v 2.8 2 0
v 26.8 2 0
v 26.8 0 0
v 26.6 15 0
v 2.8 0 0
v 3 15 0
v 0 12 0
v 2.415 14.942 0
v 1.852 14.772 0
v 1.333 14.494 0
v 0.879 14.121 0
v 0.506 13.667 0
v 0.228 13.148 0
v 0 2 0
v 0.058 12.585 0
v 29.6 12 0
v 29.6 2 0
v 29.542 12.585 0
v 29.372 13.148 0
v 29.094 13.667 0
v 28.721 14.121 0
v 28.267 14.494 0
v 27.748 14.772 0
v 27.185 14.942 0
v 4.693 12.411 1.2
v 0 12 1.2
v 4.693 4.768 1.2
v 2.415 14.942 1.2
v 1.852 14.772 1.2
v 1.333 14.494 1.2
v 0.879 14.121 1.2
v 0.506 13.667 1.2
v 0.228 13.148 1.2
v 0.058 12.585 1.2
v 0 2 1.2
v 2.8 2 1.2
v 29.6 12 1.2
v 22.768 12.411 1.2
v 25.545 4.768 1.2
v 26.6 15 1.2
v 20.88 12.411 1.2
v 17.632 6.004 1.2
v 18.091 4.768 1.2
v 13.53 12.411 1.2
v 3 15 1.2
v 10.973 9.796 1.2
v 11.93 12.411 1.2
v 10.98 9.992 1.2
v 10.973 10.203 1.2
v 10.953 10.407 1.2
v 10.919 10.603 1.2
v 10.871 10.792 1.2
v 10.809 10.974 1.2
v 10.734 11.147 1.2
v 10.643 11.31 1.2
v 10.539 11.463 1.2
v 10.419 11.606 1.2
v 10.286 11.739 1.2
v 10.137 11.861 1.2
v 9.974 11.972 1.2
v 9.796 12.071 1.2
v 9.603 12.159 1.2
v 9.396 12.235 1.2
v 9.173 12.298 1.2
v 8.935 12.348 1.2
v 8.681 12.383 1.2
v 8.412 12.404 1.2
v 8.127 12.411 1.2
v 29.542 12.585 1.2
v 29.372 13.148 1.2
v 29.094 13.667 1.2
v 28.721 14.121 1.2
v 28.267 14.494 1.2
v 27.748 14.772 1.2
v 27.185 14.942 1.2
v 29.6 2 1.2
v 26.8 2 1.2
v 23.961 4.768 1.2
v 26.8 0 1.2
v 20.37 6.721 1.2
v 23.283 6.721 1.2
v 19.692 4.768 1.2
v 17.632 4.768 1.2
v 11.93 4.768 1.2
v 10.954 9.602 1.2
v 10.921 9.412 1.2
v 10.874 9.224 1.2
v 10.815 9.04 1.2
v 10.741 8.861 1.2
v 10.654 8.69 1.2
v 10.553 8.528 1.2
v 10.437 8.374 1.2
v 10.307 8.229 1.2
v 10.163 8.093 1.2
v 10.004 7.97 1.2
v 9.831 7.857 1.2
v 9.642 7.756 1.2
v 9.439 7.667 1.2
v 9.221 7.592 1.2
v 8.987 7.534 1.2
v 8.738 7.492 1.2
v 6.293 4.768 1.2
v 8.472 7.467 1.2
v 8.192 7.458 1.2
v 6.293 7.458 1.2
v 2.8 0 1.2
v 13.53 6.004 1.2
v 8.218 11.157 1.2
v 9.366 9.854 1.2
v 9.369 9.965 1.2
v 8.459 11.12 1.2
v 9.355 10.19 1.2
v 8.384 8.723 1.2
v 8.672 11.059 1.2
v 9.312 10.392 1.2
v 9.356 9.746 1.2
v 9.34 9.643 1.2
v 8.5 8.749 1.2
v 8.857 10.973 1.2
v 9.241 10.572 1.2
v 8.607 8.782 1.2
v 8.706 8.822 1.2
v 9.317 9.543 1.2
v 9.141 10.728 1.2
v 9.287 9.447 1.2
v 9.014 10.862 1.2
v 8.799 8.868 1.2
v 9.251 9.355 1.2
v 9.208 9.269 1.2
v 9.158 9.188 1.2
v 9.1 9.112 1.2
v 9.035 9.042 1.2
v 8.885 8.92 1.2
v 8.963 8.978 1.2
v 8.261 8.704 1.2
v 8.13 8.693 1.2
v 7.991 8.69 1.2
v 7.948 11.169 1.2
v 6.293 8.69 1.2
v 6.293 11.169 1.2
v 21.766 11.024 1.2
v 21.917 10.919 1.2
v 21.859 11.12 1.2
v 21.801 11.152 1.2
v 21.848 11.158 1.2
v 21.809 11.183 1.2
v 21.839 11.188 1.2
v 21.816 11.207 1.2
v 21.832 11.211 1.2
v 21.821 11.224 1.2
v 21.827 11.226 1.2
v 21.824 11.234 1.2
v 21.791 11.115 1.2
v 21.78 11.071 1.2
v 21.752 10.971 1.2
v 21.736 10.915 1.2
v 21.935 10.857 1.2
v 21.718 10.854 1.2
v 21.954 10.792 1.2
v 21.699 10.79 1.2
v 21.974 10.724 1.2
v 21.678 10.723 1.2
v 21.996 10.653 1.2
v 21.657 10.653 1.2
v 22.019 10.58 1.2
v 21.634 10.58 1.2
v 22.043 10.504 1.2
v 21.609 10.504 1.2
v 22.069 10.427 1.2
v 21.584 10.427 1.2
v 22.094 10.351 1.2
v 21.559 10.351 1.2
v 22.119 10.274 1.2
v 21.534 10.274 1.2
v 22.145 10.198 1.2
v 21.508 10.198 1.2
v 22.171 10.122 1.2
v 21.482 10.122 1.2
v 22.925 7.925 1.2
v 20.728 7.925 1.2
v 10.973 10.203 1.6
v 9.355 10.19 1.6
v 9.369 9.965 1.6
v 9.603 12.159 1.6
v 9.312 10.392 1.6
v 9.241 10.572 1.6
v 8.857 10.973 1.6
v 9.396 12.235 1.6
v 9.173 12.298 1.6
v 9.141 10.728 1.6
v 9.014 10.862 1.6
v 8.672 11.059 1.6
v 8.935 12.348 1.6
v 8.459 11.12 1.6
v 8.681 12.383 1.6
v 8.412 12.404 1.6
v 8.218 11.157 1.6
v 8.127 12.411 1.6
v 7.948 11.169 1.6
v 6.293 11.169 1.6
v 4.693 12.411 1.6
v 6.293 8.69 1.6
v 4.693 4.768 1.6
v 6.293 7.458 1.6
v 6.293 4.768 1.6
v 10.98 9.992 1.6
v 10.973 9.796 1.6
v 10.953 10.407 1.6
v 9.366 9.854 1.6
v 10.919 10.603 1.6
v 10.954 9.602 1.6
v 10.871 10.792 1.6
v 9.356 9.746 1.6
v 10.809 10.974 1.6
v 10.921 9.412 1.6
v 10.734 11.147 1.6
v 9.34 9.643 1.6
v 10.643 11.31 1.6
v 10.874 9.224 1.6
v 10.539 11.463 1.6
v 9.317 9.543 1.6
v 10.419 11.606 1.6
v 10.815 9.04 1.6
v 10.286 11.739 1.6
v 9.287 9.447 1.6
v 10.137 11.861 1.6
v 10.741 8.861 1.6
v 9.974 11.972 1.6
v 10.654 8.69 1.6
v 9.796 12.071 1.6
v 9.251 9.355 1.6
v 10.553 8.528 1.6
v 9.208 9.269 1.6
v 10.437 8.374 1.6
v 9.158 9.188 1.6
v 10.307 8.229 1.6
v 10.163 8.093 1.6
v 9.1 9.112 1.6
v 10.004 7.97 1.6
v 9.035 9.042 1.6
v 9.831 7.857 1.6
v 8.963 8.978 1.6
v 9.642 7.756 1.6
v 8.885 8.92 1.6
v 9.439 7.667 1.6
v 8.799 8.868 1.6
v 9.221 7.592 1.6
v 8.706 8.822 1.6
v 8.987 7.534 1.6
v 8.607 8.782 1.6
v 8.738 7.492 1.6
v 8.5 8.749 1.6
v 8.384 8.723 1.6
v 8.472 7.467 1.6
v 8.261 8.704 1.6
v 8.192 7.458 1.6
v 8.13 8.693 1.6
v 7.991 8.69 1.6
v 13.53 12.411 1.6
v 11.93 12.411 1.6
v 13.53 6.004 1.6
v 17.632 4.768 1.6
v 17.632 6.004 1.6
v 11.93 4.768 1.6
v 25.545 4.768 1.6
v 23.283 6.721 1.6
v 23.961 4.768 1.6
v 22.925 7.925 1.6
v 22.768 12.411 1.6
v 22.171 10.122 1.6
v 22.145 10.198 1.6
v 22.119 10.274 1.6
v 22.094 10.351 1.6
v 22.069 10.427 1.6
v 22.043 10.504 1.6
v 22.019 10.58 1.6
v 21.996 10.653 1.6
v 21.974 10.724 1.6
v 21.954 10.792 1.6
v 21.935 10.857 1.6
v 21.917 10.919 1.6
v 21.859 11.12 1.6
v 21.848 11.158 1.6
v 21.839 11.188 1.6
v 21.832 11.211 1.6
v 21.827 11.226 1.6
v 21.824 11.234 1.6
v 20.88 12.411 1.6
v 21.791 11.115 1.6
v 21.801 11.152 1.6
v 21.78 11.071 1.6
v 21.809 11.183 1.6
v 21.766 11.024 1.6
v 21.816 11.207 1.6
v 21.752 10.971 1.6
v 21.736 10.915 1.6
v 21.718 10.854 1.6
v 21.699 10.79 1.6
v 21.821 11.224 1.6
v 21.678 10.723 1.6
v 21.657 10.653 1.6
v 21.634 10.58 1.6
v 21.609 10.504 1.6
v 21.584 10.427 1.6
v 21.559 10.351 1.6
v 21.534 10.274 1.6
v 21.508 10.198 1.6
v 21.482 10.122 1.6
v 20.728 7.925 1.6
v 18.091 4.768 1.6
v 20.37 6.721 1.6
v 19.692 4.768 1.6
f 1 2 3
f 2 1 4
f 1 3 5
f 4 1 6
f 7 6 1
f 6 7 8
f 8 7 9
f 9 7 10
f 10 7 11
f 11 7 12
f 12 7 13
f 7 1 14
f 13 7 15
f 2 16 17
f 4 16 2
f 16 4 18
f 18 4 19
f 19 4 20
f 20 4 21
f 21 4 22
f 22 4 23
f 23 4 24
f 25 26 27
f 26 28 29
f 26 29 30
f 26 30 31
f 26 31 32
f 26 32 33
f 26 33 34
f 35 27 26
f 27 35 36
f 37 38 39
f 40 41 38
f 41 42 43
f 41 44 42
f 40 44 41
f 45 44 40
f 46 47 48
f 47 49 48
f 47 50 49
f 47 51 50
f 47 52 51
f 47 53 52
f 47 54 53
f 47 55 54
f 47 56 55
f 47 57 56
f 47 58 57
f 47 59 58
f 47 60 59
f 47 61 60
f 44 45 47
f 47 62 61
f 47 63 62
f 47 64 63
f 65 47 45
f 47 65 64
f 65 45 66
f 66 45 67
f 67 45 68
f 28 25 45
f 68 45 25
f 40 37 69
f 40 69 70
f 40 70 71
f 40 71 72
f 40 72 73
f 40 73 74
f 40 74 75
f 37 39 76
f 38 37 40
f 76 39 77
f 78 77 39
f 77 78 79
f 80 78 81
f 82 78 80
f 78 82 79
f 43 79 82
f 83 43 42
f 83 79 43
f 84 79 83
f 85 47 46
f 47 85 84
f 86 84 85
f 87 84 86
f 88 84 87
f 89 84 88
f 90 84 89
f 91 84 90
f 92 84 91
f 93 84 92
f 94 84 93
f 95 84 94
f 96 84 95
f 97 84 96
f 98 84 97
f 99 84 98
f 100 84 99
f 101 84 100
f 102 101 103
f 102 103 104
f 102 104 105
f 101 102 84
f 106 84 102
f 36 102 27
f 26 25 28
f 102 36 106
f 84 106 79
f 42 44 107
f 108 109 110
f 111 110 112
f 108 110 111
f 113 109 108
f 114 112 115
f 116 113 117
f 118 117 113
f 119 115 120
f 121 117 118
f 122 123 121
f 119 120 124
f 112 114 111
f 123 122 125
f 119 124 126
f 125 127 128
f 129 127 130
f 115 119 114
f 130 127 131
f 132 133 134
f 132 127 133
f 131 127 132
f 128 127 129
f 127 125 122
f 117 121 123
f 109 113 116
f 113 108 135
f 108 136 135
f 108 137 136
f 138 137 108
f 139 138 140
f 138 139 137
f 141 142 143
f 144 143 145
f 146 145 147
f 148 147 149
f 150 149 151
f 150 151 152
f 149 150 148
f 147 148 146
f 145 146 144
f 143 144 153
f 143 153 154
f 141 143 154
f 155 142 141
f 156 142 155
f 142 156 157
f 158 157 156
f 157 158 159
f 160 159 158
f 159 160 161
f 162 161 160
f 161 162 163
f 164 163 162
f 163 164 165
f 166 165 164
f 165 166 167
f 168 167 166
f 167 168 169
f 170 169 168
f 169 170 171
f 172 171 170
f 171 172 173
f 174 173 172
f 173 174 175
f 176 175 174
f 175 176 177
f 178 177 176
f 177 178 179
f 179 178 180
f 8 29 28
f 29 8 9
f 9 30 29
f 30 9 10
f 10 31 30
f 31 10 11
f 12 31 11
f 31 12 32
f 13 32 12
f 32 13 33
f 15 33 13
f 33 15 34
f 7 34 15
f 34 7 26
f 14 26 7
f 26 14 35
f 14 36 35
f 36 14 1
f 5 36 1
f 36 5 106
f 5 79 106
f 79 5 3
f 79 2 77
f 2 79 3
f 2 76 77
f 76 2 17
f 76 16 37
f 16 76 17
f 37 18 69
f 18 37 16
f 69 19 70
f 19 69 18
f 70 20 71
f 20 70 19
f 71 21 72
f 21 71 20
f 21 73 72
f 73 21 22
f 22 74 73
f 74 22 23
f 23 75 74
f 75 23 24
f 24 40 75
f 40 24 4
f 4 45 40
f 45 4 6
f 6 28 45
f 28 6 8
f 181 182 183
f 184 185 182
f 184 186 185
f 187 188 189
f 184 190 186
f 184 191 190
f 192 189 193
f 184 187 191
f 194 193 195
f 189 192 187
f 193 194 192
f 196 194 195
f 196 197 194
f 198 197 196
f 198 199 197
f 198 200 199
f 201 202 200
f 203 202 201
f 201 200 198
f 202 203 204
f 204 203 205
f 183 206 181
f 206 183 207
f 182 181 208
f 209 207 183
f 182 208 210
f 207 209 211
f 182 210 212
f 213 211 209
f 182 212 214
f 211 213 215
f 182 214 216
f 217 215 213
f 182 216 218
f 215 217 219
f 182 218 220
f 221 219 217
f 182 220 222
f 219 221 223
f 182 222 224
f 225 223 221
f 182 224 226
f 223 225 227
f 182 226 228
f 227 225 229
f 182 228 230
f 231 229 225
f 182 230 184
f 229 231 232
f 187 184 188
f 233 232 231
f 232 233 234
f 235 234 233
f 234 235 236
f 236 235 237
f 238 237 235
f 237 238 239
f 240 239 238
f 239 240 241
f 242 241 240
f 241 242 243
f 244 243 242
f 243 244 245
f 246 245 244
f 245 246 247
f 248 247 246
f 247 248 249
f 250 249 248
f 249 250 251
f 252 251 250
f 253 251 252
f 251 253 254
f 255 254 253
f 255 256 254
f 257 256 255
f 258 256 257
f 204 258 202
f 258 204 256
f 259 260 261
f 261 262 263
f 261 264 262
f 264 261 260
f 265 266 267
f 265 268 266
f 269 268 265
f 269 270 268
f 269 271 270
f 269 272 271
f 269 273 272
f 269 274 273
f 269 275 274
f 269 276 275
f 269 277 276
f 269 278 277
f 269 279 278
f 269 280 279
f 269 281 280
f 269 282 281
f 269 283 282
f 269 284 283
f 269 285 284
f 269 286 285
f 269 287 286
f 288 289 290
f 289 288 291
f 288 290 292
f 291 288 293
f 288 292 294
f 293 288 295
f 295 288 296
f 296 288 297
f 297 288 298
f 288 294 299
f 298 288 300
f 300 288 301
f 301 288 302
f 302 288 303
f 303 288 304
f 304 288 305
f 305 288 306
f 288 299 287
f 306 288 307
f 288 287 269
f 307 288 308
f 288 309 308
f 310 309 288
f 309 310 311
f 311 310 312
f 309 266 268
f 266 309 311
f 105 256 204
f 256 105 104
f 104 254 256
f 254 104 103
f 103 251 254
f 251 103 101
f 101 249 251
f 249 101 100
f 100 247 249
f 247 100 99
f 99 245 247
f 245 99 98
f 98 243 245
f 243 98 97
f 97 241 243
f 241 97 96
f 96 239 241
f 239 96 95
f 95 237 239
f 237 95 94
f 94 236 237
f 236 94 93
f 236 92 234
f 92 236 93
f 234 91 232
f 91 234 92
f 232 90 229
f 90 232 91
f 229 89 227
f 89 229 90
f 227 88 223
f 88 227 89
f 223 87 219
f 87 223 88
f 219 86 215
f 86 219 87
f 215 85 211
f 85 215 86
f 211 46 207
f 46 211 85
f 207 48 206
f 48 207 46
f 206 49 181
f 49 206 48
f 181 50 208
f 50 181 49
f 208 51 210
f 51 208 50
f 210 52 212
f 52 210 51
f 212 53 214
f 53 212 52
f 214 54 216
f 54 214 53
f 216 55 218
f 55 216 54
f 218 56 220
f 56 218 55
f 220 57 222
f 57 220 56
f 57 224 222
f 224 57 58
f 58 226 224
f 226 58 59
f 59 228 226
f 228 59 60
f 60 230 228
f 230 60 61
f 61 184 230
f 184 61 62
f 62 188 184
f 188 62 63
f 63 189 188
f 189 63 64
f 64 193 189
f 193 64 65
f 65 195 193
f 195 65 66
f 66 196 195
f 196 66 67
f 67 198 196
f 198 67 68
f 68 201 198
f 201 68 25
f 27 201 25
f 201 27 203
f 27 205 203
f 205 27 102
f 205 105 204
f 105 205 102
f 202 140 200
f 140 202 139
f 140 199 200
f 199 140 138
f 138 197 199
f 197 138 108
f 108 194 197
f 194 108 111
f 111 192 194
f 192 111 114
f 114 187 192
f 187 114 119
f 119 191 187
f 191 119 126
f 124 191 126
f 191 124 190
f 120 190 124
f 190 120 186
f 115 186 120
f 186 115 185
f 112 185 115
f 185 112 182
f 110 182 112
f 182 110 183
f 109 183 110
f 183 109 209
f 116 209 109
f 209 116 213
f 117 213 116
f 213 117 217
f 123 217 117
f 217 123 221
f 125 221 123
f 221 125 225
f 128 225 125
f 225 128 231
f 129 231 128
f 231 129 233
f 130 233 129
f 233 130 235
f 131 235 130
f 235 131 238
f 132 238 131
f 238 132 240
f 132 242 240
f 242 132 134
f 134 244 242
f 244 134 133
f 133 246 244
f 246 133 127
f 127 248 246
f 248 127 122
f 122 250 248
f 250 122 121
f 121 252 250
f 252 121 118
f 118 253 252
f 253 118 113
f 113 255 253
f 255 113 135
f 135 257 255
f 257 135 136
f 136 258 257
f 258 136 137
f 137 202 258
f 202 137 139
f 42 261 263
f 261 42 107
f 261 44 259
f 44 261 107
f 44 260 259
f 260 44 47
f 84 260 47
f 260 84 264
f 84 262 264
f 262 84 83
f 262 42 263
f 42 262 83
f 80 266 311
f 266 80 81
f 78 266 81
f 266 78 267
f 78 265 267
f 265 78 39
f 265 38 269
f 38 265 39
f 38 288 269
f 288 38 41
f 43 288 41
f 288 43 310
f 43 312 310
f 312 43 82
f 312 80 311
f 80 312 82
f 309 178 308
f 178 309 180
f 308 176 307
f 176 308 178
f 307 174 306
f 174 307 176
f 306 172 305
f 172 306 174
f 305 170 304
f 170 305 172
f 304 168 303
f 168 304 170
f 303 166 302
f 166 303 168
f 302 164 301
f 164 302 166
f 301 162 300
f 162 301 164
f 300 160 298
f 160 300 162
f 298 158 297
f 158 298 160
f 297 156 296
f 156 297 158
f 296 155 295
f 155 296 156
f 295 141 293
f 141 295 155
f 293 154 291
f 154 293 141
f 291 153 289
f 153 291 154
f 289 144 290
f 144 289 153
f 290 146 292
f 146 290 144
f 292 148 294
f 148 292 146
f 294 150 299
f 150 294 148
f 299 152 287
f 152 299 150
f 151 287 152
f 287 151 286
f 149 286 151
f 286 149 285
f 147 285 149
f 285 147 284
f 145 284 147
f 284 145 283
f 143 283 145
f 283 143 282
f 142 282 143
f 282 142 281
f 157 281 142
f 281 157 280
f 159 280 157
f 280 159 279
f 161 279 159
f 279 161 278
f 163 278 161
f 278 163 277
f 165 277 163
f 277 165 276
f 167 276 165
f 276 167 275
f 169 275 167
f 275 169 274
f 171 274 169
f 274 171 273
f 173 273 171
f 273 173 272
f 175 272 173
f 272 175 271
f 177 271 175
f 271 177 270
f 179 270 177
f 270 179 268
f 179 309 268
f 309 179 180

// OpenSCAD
/* [label] */
Text="PLA";
Text_Style="Emboss"; //["Emboss", "Engrave", "Inset"]
Text_Size=8;
Text_Depth=0.4;
Text_Color="#000000"; //color
Back_Color="#00EEFF"; //color
Font_Face="Liberation Sans"; // ["Aldo", "Anton", "Archivo Black", "Asap", "Bangers", "Black Han Sans", "Bubblegum Sans", "Bungee", "Changa One", "Chewy", "Concert One", "Fruktur", "Gochi Hand", "Griffy", "HarmonyOS Sans SC", "Inter", "Inter Tight", "Itim", "Jockey One", "Kanit", "Kavoon", "Komikazoom", "Lato", "Liberation Sans", "Lilita One", "Lobster", "Lora", "Luckiest Guy", "Merriweather", "Merriweather Sans", "Mitr", "Montserrat", "Montserrat Alternates", "Montserrat Subrayada", "Nanum Pen", "Norwester", "Noto Emoji", "Noto Sans", "Noto Sans Adlam", "Noto Sans Adlam Unjoined", "Noto Sans Anatolian Hieroglyphs", "Noto Sans Arabic", "Noto Sans Arabic UI", "Noto Sans Armenian", "Noto Sans Avestan", "Noto Sans Balinese", "Noto Sans Bamum", "Noto Sans Bassa Vah", "Noto Sans Batak", "Noto Sans Bengali", "Noto Sans Bengali UI", "Noto Sans Bhaiksuki", "Noto Sans Brahmi", "Noto Sans Buginese", "Noto Sans Buhid", "Noto Sans Canadian Aboriginal", "Noto Sans Carian", "Noto Sans Caucasian Albanian", "Noto Sans Chakma", "Noto Sans Cham", "Noto Sans Cherokee", "Noto Sans Chorasmian", "Noto Sans Coptic", "Noto Sans Cuneiform", "Noto Sans Cypriot", "Noto Sans Cypro Minoan", "Noto Sans Deseret", "Noto Sans Devanagari", "Noto Sans Devanagari UI", "Noto Sans Display", "Noto Sans Duployan", "Noto Sans Egyptian Hieroglyphs", "Noto Sans Elbasan", "Noto Sans Elymaic", "Noto Sans Ethiopic", "Noto Sans Georgian", "Noto Sans Glagolitic", "Noto Sans Gothic", "Noto Sans Grantha", "Noto Sans Gujarati", "Noto Sans Gujarati UI", "Noto Sans Gunjala Gondi", "Noto Sans Gurmukhi", "Noto Sans Gurmukhi UI", "Noto Sans HK", "Noto Sans Hanifi Rohingya", "Noto Sans Hanunoo", "Noto Sans Hatran", "Noto Sans Hebrew", "Noto Sans Imperial Aramaic", "Noto Sans Indic Siyaq Numbers", "Noto Sans Inscriptional Pahlavi", "Noto Sans Inscriptional Parthian", "Noto Sans JP", "Noto Sans Javanese", "Noto Sans KR", "Noto Sans Kaithi", "Noto Sans Kannada", "Noto Sans Kannada UI", "Noto Sans Kawi", "Noto Sans Kayah Li", "Noto Sans Kharoshthi", "Noto Sans Khmer", "Noto Sans Khmer UI", "Noto Sans Khojki", "Noto Sans Khudawadi", "Noto Sans Lao", "Noto Sans Lao Looped", "Noto Sans Lao UI", "Noto Sans Lepcha", "Noto Sans Limbu", "Noto Sans Linear A", "Noto Sans Linear B", "Noto Sans Lisu", "Noto Sans Lycian", "Noto Sans Lydian", "Noto Sans Mahajani", "Noto Sans Malayalam", "Noto Sans Malayalam UI", "Noto Sans Mandaic", "Noto Sans Manichaean", "Noto Sans Marchen", "Noto Sans Masaram Gondi", "Noto Sans Math", "Noto Sans Mayan Numerals", "Noto Sans Medefaidrin", "Noto Sans Meetei Mayek", "Noto Sans Mende Kikakui", "Noto Sans Meroitic", "Noto Sans Miao", "Noto Sans Modi", "Noto Sans Mongolian", "Noto Sans Mono", "Noto Sans Mro", "Noto Sans Multani", "Noto Sans Myanmar", "Noto Sans Myanmar UI", "Noto Sans NKo", "Noto Sans NKo Unjoined", "Noto Sans Nabataean", "Noto Sans Nag Mundari", "Noto Sans Nandinagari", "Noto Sans New Tai Lue", "Noto Sans Newa", "Noto Sans Nushu", "Noto Sans Ogham", "Noto Sans Ol Chiki", "Noto Sans Old Hungarian", "Noto Sans Old Italic", "Noto Sans Old North Arabian", "Noto Sans Old Permic", "Noto Sans Old Persian", "Noto Sans Old Sogdian", "Noto Sans Old South Arabian", "Noto Sans Old Turkic", "Noto Sans Oriya", "Noto Sans Oriya UI", "Noto Sans Osage", "Noto Sans Osmanya", "Noto Sans Pahawh Hmong", "Noto Sans Palmyrene", "Noto Sans Pau Cin Hau", "Noto Sans PhagsPa", "Noto Sans Phoenician", "Noto Sans Psalter Pahlavi", "Noto Sans Rejang", "Noto Sans Runic", "Noto Sans SC", "Noto Sans Samaritan", "Noto Sans Saurashtra", "Noto Sans Sharada", "Noto Sans Shavian", "Noto Sans Siddham", "Noto Sans SignWriting", "Noto Sans Sinhala", "Noto Sans Sinhala UI", "Noto Sans Sogdian", "Noto Sans Sora Sompeng", "Noto Sans Soyombo", "Noto Sans Sundanese", "Noto Sans Syloti Nagri", "Noto Sans Symbols", "Noto Sans Symbols 2", "Noto Sans Syriac", "Noto Sans Syriac Eastern", "Noto Sans TC", "Noto Sans Tagalog", "Noto Sans Tagbanwa", "Noto Sans Tai Le", "Noto Sans Tai Tham", "Noto Sans Tai Viet", "Noto Sans Takri", "Noto Sans Tamil", "Noto Sans Tamil Supplement", "Noto Sans Tamil UI", "Noto Sans Tangsa", "Noto Sans Telugu", "Noto Sans Telugu UI", "Noto Sans Thaana", "Noto Sans Thai", "Noto Sans Thai Looped", "Noto Sans Thai UI", "Noto Sans Tifinagh", "Noto Sans Tirhuta", "Noto Sans Ugaritic", "Noto Sans Vai", "Noto Sans Vithkuqi", "Noto Sans Wancho", "Noto Sans Warang Citi", "Noto Sans Yi", "Noto Sans Zanabazar Square", "Nunito", "Nunito Sans", "Open Sans", "Open Sans Condensed", "Open Sans Hebrew", "Open Sans Hebrew Condensed", "Orbitron", "Oswald", "Palanquin Dark", "Passion One", "Patrick Hand", "Paytone One", "Permanent Marker", "Playfair Display", "Playfair Display SC", "Plus Jakarta Sans", "PoetsenOne", "Poppins", "Rakkas", "Raleway", "Raleway Dots", "Roboto", "Roboto Condensed", "Roboto Flex", "Roboto Mono", "Roboto Serif", "Roboto Slab", "Rubik", "Rubik 80s Fade", "Rubik Beastly", "Rubik Broken Fax", "Rubik Bubbles", "Rubik Burned", "Rubik Dirt", "Rubik Distressed", "Rubik Doodle Shadow", "Rubik Doodle Triangles", "Rubik Gemstones", "Rubik Glitch", "Rubik Glitch Pop", "Rubik Iso", "Rubik Lines", "Rubik Maps", "Rubik Marker Hatch", "Rubik Maze", "Rubik Microbe", "Rubik Mono One", "Rubik Moonrocks", "Rubik One", "Rubik Pixels", "Rubik Puddles", "Rubik Scribble", "Rubik Spray Paint", "Rubik Storm", "Rubik Vinyl", "Rubik Wet Paint", "Russo One", "Saira Stencil One", "Shrikhand", "Source Sans 3", "Spicy Rice", "Squada One", "Titan One", "Ubuntu", "Ubuntu Condensed", "Ubuntu Mono", "Ubuntu Sans", "Ubuntu Sans Mono", "Work Sans"]
Font_Style="Bold"; //["Light", "Regular", "Medium", "Bold", "ExtraBold"]

/* [Hidden] */
lblDims=[29.6,1.2,15];
lblSpcng=0.1;
lblLidLen=2;
lblLidWdth=24;

fudge=0.1;


  
label();
module label(){
  rad=3;

  $fn=32;
  difference(){
    color(Back_Color) linear_extrude(lblDims.y){
      translate([0,lblLidLen]) square([lblDims.x,lblDims.z-lblLidLen-rad]);
      translate([rad,lblDims.z-rad]) square([lblDims.x-rad*2,rad]);
      for (ix=[0,1])
        translate([rad+ix*(lblDims.x-rad*2),lblDims.z-rad]) circle(r=rad);
      translate([(lblDims.x-lblLidWdth)/2,0]) square([lblLidWdth,lblLidLen]);
      
    }
  if (Text_Style=="Engrave") color(Text_Color) 
    translate([0,0,lblDims.y-Text_Depth]) linear_extrude(Text_Depth+fudge,convexity=3) txtLine();
  if (Text_Style=="Inset") color(Back_Color)
    translate([0,0,lblDims.y-Text_Depth*2]) linear_extrude(Text_Depth*2+fudge,convexity=3) txtLine();
  }
  if (Text_Style=="Emboss") color(Text_Color) 
    translate([0,0,lblDims.y]) linear_extrude(Text_Depth) txtLine();
  if (Text_Style=="Inset") color(Text_Color)
    translate([0,0,lblDims.y-Text_Depth*2]) linear_extrude(Text_Depth,convexity=3) txtLine();
  
}


module txtLine() {
    translate([lblDims.x/2,(lblDims.z+lblLidLen)/2,0]) 
        text(
            text = Text,
            font = str(Font_Face, ":style=", Font_Style),
            size = Text_Size,
            valign = "center",
            halign = "center"
        );
}
